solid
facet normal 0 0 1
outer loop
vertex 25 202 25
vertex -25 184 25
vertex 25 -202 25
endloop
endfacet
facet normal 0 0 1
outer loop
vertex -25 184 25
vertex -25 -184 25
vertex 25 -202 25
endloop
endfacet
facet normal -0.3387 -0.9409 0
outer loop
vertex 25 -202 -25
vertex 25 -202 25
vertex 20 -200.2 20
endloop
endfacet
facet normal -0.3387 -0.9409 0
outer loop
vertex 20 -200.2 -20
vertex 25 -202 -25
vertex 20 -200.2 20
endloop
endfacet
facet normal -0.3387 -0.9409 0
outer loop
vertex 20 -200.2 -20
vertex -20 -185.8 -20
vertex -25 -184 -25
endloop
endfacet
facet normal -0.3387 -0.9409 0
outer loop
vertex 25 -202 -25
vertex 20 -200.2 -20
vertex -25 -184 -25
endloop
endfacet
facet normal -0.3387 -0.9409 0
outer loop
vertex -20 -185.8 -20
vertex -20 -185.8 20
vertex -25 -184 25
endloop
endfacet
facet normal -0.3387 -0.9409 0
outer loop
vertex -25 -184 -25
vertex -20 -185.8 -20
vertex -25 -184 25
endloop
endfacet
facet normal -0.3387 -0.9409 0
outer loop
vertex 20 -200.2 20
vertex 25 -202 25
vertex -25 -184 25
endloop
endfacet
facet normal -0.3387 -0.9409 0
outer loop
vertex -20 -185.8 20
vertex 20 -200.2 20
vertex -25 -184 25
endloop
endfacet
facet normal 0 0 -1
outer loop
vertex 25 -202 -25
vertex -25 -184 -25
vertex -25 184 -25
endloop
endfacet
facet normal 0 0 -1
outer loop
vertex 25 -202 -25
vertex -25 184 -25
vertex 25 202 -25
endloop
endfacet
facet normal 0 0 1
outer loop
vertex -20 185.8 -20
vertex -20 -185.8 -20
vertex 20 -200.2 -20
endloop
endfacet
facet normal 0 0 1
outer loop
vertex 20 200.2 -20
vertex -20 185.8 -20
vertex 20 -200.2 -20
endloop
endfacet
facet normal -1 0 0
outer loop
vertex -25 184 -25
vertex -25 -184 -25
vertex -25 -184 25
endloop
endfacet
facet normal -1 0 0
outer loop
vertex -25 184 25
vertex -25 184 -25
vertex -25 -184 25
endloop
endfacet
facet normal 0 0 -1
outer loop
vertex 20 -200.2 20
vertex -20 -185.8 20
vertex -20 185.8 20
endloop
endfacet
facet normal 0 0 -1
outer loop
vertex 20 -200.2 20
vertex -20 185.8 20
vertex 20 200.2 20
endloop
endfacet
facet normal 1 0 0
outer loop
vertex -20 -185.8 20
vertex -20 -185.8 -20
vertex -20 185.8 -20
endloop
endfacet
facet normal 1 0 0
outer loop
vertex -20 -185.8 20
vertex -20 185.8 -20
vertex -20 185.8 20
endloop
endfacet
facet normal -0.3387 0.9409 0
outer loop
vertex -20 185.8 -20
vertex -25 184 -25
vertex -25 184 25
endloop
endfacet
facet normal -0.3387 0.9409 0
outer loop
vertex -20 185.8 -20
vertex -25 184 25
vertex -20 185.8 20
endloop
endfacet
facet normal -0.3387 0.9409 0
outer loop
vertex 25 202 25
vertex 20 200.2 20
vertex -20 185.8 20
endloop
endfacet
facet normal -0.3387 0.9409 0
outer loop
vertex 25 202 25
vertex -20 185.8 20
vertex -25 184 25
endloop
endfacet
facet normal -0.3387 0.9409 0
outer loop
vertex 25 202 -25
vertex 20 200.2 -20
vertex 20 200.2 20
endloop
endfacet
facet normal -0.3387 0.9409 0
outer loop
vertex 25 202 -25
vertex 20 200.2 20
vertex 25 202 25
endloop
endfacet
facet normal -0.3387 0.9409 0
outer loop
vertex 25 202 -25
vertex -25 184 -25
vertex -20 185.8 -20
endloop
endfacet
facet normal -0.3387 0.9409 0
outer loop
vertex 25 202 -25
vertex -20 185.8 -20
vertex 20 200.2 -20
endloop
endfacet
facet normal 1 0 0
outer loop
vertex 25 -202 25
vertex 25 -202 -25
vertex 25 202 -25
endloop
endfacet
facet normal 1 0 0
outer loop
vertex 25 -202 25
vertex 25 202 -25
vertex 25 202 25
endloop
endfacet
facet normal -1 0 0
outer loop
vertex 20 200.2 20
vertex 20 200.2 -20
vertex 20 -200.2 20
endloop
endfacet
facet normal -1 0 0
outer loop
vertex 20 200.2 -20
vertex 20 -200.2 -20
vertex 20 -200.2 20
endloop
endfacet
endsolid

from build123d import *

# Parameters (mm, degrees)
F0_W          = 50
F0_H          = 50
F0_W_2        = 40
F0_H_2        = 40
F1_DEPTH      = 202
F3_DEPTH      = 25.001
F3_DEPTH_BACK = 25.001


with BuildPart() as f1:
    # F0 (on Front) → F1 (new body, symmetric)
    with BuildSketch(Plane.XZ):
        Rectangle(F0_W, F0_H)
        Rectangle(F0_W_2, F0_H_2, mode=Mode.SUBTRACT)
    extrude(amount=F1_DEPTH, both=True)

    # F2 (on Top) → F3 (cut, two sides)
    with BuildSketch(Plane.XY) as f3_sk:
        Polygon((-25, 184), (25, 202), (-25, 202), align=None)
        Polygon((-25, -202), (25, -202), (-25, -184), align=None)
    extrude(amount=-F3_DEPTH, mode=Mode.SUBTRACT)
    extrude(f3_sk.sketch, amount=F3_DEPTH_BACK, mode=Mode.SUBTRACT)


solid = f1.part
